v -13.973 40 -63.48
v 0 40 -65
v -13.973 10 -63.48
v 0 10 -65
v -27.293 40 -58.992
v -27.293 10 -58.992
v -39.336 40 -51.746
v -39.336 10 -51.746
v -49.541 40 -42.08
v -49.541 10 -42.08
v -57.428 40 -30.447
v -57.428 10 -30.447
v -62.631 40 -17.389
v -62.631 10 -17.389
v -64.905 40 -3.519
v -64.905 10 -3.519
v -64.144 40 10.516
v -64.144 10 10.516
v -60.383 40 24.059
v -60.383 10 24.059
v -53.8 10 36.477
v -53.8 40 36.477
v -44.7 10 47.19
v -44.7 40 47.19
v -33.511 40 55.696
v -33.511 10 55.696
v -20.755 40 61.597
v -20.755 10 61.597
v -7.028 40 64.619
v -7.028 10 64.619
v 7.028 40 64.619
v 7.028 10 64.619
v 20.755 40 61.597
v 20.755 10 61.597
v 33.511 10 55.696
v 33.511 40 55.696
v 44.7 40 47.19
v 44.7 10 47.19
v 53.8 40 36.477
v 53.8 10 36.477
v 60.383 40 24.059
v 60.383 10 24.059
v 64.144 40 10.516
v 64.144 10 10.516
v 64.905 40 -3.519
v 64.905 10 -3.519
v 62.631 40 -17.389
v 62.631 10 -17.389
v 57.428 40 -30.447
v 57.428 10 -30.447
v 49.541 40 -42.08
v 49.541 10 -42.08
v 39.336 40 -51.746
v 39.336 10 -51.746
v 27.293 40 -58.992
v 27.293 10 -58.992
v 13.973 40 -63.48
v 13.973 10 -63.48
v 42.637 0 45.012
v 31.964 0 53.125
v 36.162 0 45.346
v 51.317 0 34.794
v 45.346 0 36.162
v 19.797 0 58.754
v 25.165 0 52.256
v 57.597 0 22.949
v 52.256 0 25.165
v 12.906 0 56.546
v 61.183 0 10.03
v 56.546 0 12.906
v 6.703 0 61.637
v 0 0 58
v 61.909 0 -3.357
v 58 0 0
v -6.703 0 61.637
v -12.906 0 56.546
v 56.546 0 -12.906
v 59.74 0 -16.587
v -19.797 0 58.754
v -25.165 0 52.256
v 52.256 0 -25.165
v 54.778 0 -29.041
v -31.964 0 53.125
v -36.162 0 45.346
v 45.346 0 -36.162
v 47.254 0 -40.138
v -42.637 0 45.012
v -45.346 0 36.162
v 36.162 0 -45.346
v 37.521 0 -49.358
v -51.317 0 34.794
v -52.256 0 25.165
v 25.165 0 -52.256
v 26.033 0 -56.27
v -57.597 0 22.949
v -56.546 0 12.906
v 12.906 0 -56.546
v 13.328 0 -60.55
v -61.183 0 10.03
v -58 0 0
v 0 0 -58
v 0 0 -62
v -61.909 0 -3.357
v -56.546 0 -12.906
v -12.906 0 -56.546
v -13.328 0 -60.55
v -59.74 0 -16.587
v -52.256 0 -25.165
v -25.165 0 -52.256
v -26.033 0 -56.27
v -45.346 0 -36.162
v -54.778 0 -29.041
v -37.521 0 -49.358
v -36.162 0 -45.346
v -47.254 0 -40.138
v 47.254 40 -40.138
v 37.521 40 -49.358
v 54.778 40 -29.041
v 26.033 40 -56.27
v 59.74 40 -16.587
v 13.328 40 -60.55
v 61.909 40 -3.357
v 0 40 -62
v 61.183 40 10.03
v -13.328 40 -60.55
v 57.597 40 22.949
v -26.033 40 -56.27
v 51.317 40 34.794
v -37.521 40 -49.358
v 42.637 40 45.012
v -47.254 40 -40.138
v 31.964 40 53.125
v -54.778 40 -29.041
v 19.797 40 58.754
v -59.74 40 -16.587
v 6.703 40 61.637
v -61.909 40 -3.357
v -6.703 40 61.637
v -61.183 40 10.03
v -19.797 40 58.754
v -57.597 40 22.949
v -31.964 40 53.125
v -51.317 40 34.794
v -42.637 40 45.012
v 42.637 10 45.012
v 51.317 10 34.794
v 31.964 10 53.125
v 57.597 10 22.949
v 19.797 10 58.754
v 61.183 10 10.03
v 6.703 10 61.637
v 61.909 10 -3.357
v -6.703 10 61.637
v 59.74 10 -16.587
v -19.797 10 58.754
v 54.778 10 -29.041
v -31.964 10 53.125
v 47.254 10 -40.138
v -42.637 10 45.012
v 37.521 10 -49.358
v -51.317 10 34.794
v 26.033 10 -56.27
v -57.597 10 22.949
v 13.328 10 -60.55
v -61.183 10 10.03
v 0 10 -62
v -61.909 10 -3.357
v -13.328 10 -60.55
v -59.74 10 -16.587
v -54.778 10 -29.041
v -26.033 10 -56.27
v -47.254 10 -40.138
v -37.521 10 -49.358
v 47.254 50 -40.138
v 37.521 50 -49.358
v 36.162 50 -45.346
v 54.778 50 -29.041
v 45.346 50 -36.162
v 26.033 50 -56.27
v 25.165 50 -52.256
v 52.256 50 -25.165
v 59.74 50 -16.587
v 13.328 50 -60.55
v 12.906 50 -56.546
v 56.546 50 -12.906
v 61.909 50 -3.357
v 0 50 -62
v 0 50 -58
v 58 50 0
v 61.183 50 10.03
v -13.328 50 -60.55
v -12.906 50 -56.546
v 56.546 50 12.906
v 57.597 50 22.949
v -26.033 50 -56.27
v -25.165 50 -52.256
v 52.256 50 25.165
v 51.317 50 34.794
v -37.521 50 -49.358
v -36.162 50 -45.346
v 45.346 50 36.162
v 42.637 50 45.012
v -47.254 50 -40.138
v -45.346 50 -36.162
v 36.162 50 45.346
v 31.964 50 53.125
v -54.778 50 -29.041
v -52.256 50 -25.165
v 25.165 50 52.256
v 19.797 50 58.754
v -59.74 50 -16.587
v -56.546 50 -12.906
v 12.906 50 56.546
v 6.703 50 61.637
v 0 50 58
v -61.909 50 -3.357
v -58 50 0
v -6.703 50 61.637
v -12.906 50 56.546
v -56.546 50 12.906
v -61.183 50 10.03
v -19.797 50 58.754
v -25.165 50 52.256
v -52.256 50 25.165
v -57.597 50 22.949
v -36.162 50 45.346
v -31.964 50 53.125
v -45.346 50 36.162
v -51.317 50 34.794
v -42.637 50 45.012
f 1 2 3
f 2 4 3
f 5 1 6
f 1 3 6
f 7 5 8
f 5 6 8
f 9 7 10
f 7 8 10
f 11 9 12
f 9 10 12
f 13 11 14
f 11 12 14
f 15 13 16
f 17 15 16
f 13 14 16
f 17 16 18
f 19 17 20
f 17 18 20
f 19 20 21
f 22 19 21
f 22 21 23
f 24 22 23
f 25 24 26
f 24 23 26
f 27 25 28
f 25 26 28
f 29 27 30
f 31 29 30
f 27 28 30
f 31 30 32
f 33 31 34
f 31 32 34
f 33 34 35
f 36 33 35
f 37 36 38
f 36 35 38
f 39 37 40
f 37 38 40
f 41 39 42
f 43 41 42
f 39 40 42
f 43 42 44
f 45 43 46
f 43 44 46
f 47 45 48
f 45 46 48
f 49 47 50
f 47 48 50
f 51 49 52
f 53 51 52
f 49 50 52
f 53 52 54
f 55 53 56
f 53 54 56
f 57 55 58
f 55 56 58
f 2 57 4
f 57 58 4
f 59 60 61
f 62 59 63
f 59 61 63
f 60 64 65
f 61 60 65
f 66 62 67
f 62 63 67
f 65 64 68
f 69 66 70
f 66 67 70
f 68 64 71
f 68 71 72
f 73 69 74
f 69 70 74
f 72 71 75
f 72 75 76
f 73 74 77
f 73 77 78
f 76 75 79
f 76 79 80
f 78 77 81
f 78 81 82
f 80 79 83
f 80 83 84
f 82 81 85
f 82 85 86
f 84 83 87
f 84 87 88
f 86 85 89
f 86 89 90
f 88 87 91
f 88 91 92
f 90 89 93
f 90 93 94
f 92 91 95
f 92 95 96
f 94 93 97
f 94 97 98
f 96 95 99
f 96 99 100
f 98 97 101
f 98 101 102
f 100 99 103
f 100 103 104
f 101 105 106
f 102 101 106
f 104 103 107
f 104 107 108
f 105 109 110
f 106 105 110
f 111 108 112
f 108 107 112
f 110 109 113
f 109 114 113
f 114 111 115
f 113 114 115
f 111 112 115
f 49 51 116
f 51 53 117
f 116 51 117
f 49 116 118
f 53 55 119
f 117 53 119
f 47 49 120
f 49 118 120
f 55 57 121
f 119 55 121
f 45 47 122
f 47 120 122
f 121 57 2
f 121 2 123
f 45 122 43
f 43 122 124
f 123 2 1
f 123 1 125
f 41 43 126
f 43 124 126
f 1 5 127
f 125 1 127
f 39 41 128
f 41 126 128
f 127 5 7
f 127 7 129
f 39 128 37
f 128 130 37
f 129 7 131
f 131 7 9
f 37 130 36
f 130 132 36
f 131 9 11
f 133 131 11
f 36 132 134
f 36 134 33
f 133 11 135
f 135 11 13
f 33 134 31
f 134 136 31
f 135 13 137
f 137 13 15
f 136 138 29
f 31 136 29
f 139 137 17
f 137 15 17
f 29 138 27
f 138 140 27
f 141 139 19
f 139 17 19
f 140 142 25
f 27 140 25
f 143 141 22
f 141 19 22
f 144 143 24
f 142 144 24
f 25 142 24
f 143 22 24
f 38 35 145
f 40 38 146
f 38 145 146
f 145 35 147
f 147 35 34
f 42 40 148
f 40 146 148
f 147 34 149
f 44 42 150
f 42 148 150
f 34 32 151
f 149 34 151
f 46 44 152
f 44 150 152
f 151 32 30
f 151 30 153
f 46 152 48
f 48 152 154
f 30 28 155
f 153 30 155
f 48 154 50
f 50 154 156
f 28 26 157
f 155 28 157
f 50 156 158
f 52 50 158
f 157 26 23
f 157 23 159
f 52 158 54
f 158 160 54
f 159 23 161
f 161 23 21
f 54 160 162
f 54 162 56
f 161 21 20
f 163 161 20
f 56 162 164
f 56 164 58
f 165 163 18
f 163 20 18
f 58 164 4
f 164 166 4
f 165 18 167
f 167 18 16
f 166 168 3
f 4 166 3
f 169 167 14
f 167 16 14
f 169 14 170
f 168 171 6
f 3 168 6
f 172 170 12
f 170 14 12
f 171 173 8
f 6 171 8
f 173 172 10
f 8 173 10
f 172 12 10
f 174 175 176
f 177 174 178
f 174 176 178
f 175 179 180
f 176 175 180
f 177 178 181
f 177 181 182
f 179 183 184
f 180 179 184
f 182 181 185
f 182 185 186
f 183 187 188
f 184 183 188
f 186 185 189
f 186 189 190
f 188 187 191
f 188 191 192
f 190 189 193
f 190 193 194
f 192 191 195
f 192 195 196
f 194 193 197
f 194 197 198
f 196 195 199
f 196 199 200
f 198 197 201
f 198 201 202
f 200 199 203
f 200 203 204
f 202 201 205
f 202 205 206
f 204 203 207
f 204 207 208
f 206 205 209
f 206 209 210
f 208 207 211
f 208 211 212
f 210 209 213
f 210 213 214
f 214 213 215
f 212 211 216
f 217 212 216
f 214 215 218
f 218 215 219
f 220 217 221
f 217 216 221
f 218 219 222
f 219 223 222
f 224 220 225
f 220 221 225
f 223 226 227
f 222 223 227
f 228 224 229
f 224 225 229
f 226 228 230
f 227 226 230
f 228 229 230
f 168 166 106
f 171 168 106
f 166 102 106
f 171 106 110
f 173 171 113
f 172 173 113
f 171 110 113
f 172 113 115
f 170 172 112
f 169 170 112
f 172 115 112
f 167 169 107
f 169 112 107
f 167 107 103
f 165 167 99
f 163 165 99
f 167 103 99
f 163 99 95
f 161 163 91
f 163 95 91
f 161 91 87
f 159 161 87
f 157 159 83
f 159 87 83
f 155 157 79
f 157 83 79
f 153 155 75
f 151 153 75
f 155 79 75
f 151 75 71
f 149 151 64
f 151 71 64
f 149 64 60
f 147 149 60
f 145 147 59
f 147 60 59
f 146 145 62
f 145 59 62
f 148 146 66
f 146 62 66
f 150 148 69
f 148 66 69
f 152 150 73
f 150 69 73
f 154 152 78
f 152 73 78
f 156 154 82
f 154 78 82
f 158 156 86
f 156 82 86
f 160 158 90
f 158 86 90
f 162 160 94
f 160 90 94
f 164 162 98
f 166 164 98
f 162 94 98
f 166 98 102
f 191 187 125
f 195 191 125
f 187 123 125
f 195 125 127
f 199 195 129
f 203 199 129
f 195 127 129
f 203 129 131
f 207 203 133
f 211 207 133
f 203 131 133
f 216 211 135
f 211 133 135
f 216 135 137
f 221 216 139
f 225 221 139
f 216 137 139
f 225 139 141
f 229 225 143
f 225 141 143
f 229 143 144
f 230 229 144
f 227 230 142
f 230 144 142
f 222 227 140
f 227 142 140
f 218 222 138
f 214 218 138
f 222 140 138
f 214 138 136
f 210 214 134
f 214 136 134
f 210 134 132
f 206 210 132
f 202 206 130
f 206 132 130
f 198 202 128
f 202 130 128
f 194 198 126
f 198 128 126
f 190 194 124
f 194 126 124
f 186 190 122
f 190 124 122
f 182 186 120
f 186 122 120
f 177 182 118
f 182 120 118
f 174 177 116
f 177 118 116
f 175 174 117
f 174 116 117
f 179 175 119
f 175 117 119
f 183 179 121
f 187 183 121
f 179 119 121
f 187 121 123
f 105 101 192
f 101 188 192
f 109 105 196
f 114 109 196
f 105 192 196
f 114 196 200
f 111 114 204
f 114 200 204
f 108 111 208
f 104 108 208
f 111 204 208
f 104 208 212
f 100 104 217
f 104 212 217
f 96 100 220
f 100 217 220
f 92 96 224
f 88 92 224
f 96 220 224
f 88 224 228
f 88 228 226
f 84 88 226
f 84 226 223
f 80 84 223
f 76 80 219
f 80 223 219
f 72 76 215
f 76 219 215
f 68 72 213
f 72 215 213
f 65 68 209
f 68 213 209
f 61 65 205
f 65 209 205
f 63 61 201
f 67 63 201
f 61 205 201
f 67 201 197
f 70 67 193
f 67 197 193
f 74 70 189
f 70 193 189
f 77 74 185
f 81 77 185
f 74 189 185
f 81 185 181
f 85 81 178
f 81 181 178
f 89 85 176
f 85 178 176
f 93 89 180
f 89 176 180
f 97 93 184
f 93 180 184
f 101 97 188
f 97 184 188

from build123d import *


with BuildPart() as part:
    # Szkic1 → Obrót1 (revolve)
    with BuildSketch(Plane.XY, mode=Mode.PRIVATE) as obr_t1_sk:
        Polygon((-62, 0), (-58, 0), (-58, 50), (-62, 50), (-62, 40), (-65, 40), (-65, 10), (-62, 10), align=None)
    revolve(obr_t1_sk.sketch.rotate(Axis((0, 0, 0), (0, 1, 0)), 270), axis=Axis((0, 0, 0), (0, 1, 0)))


solid = part.part
